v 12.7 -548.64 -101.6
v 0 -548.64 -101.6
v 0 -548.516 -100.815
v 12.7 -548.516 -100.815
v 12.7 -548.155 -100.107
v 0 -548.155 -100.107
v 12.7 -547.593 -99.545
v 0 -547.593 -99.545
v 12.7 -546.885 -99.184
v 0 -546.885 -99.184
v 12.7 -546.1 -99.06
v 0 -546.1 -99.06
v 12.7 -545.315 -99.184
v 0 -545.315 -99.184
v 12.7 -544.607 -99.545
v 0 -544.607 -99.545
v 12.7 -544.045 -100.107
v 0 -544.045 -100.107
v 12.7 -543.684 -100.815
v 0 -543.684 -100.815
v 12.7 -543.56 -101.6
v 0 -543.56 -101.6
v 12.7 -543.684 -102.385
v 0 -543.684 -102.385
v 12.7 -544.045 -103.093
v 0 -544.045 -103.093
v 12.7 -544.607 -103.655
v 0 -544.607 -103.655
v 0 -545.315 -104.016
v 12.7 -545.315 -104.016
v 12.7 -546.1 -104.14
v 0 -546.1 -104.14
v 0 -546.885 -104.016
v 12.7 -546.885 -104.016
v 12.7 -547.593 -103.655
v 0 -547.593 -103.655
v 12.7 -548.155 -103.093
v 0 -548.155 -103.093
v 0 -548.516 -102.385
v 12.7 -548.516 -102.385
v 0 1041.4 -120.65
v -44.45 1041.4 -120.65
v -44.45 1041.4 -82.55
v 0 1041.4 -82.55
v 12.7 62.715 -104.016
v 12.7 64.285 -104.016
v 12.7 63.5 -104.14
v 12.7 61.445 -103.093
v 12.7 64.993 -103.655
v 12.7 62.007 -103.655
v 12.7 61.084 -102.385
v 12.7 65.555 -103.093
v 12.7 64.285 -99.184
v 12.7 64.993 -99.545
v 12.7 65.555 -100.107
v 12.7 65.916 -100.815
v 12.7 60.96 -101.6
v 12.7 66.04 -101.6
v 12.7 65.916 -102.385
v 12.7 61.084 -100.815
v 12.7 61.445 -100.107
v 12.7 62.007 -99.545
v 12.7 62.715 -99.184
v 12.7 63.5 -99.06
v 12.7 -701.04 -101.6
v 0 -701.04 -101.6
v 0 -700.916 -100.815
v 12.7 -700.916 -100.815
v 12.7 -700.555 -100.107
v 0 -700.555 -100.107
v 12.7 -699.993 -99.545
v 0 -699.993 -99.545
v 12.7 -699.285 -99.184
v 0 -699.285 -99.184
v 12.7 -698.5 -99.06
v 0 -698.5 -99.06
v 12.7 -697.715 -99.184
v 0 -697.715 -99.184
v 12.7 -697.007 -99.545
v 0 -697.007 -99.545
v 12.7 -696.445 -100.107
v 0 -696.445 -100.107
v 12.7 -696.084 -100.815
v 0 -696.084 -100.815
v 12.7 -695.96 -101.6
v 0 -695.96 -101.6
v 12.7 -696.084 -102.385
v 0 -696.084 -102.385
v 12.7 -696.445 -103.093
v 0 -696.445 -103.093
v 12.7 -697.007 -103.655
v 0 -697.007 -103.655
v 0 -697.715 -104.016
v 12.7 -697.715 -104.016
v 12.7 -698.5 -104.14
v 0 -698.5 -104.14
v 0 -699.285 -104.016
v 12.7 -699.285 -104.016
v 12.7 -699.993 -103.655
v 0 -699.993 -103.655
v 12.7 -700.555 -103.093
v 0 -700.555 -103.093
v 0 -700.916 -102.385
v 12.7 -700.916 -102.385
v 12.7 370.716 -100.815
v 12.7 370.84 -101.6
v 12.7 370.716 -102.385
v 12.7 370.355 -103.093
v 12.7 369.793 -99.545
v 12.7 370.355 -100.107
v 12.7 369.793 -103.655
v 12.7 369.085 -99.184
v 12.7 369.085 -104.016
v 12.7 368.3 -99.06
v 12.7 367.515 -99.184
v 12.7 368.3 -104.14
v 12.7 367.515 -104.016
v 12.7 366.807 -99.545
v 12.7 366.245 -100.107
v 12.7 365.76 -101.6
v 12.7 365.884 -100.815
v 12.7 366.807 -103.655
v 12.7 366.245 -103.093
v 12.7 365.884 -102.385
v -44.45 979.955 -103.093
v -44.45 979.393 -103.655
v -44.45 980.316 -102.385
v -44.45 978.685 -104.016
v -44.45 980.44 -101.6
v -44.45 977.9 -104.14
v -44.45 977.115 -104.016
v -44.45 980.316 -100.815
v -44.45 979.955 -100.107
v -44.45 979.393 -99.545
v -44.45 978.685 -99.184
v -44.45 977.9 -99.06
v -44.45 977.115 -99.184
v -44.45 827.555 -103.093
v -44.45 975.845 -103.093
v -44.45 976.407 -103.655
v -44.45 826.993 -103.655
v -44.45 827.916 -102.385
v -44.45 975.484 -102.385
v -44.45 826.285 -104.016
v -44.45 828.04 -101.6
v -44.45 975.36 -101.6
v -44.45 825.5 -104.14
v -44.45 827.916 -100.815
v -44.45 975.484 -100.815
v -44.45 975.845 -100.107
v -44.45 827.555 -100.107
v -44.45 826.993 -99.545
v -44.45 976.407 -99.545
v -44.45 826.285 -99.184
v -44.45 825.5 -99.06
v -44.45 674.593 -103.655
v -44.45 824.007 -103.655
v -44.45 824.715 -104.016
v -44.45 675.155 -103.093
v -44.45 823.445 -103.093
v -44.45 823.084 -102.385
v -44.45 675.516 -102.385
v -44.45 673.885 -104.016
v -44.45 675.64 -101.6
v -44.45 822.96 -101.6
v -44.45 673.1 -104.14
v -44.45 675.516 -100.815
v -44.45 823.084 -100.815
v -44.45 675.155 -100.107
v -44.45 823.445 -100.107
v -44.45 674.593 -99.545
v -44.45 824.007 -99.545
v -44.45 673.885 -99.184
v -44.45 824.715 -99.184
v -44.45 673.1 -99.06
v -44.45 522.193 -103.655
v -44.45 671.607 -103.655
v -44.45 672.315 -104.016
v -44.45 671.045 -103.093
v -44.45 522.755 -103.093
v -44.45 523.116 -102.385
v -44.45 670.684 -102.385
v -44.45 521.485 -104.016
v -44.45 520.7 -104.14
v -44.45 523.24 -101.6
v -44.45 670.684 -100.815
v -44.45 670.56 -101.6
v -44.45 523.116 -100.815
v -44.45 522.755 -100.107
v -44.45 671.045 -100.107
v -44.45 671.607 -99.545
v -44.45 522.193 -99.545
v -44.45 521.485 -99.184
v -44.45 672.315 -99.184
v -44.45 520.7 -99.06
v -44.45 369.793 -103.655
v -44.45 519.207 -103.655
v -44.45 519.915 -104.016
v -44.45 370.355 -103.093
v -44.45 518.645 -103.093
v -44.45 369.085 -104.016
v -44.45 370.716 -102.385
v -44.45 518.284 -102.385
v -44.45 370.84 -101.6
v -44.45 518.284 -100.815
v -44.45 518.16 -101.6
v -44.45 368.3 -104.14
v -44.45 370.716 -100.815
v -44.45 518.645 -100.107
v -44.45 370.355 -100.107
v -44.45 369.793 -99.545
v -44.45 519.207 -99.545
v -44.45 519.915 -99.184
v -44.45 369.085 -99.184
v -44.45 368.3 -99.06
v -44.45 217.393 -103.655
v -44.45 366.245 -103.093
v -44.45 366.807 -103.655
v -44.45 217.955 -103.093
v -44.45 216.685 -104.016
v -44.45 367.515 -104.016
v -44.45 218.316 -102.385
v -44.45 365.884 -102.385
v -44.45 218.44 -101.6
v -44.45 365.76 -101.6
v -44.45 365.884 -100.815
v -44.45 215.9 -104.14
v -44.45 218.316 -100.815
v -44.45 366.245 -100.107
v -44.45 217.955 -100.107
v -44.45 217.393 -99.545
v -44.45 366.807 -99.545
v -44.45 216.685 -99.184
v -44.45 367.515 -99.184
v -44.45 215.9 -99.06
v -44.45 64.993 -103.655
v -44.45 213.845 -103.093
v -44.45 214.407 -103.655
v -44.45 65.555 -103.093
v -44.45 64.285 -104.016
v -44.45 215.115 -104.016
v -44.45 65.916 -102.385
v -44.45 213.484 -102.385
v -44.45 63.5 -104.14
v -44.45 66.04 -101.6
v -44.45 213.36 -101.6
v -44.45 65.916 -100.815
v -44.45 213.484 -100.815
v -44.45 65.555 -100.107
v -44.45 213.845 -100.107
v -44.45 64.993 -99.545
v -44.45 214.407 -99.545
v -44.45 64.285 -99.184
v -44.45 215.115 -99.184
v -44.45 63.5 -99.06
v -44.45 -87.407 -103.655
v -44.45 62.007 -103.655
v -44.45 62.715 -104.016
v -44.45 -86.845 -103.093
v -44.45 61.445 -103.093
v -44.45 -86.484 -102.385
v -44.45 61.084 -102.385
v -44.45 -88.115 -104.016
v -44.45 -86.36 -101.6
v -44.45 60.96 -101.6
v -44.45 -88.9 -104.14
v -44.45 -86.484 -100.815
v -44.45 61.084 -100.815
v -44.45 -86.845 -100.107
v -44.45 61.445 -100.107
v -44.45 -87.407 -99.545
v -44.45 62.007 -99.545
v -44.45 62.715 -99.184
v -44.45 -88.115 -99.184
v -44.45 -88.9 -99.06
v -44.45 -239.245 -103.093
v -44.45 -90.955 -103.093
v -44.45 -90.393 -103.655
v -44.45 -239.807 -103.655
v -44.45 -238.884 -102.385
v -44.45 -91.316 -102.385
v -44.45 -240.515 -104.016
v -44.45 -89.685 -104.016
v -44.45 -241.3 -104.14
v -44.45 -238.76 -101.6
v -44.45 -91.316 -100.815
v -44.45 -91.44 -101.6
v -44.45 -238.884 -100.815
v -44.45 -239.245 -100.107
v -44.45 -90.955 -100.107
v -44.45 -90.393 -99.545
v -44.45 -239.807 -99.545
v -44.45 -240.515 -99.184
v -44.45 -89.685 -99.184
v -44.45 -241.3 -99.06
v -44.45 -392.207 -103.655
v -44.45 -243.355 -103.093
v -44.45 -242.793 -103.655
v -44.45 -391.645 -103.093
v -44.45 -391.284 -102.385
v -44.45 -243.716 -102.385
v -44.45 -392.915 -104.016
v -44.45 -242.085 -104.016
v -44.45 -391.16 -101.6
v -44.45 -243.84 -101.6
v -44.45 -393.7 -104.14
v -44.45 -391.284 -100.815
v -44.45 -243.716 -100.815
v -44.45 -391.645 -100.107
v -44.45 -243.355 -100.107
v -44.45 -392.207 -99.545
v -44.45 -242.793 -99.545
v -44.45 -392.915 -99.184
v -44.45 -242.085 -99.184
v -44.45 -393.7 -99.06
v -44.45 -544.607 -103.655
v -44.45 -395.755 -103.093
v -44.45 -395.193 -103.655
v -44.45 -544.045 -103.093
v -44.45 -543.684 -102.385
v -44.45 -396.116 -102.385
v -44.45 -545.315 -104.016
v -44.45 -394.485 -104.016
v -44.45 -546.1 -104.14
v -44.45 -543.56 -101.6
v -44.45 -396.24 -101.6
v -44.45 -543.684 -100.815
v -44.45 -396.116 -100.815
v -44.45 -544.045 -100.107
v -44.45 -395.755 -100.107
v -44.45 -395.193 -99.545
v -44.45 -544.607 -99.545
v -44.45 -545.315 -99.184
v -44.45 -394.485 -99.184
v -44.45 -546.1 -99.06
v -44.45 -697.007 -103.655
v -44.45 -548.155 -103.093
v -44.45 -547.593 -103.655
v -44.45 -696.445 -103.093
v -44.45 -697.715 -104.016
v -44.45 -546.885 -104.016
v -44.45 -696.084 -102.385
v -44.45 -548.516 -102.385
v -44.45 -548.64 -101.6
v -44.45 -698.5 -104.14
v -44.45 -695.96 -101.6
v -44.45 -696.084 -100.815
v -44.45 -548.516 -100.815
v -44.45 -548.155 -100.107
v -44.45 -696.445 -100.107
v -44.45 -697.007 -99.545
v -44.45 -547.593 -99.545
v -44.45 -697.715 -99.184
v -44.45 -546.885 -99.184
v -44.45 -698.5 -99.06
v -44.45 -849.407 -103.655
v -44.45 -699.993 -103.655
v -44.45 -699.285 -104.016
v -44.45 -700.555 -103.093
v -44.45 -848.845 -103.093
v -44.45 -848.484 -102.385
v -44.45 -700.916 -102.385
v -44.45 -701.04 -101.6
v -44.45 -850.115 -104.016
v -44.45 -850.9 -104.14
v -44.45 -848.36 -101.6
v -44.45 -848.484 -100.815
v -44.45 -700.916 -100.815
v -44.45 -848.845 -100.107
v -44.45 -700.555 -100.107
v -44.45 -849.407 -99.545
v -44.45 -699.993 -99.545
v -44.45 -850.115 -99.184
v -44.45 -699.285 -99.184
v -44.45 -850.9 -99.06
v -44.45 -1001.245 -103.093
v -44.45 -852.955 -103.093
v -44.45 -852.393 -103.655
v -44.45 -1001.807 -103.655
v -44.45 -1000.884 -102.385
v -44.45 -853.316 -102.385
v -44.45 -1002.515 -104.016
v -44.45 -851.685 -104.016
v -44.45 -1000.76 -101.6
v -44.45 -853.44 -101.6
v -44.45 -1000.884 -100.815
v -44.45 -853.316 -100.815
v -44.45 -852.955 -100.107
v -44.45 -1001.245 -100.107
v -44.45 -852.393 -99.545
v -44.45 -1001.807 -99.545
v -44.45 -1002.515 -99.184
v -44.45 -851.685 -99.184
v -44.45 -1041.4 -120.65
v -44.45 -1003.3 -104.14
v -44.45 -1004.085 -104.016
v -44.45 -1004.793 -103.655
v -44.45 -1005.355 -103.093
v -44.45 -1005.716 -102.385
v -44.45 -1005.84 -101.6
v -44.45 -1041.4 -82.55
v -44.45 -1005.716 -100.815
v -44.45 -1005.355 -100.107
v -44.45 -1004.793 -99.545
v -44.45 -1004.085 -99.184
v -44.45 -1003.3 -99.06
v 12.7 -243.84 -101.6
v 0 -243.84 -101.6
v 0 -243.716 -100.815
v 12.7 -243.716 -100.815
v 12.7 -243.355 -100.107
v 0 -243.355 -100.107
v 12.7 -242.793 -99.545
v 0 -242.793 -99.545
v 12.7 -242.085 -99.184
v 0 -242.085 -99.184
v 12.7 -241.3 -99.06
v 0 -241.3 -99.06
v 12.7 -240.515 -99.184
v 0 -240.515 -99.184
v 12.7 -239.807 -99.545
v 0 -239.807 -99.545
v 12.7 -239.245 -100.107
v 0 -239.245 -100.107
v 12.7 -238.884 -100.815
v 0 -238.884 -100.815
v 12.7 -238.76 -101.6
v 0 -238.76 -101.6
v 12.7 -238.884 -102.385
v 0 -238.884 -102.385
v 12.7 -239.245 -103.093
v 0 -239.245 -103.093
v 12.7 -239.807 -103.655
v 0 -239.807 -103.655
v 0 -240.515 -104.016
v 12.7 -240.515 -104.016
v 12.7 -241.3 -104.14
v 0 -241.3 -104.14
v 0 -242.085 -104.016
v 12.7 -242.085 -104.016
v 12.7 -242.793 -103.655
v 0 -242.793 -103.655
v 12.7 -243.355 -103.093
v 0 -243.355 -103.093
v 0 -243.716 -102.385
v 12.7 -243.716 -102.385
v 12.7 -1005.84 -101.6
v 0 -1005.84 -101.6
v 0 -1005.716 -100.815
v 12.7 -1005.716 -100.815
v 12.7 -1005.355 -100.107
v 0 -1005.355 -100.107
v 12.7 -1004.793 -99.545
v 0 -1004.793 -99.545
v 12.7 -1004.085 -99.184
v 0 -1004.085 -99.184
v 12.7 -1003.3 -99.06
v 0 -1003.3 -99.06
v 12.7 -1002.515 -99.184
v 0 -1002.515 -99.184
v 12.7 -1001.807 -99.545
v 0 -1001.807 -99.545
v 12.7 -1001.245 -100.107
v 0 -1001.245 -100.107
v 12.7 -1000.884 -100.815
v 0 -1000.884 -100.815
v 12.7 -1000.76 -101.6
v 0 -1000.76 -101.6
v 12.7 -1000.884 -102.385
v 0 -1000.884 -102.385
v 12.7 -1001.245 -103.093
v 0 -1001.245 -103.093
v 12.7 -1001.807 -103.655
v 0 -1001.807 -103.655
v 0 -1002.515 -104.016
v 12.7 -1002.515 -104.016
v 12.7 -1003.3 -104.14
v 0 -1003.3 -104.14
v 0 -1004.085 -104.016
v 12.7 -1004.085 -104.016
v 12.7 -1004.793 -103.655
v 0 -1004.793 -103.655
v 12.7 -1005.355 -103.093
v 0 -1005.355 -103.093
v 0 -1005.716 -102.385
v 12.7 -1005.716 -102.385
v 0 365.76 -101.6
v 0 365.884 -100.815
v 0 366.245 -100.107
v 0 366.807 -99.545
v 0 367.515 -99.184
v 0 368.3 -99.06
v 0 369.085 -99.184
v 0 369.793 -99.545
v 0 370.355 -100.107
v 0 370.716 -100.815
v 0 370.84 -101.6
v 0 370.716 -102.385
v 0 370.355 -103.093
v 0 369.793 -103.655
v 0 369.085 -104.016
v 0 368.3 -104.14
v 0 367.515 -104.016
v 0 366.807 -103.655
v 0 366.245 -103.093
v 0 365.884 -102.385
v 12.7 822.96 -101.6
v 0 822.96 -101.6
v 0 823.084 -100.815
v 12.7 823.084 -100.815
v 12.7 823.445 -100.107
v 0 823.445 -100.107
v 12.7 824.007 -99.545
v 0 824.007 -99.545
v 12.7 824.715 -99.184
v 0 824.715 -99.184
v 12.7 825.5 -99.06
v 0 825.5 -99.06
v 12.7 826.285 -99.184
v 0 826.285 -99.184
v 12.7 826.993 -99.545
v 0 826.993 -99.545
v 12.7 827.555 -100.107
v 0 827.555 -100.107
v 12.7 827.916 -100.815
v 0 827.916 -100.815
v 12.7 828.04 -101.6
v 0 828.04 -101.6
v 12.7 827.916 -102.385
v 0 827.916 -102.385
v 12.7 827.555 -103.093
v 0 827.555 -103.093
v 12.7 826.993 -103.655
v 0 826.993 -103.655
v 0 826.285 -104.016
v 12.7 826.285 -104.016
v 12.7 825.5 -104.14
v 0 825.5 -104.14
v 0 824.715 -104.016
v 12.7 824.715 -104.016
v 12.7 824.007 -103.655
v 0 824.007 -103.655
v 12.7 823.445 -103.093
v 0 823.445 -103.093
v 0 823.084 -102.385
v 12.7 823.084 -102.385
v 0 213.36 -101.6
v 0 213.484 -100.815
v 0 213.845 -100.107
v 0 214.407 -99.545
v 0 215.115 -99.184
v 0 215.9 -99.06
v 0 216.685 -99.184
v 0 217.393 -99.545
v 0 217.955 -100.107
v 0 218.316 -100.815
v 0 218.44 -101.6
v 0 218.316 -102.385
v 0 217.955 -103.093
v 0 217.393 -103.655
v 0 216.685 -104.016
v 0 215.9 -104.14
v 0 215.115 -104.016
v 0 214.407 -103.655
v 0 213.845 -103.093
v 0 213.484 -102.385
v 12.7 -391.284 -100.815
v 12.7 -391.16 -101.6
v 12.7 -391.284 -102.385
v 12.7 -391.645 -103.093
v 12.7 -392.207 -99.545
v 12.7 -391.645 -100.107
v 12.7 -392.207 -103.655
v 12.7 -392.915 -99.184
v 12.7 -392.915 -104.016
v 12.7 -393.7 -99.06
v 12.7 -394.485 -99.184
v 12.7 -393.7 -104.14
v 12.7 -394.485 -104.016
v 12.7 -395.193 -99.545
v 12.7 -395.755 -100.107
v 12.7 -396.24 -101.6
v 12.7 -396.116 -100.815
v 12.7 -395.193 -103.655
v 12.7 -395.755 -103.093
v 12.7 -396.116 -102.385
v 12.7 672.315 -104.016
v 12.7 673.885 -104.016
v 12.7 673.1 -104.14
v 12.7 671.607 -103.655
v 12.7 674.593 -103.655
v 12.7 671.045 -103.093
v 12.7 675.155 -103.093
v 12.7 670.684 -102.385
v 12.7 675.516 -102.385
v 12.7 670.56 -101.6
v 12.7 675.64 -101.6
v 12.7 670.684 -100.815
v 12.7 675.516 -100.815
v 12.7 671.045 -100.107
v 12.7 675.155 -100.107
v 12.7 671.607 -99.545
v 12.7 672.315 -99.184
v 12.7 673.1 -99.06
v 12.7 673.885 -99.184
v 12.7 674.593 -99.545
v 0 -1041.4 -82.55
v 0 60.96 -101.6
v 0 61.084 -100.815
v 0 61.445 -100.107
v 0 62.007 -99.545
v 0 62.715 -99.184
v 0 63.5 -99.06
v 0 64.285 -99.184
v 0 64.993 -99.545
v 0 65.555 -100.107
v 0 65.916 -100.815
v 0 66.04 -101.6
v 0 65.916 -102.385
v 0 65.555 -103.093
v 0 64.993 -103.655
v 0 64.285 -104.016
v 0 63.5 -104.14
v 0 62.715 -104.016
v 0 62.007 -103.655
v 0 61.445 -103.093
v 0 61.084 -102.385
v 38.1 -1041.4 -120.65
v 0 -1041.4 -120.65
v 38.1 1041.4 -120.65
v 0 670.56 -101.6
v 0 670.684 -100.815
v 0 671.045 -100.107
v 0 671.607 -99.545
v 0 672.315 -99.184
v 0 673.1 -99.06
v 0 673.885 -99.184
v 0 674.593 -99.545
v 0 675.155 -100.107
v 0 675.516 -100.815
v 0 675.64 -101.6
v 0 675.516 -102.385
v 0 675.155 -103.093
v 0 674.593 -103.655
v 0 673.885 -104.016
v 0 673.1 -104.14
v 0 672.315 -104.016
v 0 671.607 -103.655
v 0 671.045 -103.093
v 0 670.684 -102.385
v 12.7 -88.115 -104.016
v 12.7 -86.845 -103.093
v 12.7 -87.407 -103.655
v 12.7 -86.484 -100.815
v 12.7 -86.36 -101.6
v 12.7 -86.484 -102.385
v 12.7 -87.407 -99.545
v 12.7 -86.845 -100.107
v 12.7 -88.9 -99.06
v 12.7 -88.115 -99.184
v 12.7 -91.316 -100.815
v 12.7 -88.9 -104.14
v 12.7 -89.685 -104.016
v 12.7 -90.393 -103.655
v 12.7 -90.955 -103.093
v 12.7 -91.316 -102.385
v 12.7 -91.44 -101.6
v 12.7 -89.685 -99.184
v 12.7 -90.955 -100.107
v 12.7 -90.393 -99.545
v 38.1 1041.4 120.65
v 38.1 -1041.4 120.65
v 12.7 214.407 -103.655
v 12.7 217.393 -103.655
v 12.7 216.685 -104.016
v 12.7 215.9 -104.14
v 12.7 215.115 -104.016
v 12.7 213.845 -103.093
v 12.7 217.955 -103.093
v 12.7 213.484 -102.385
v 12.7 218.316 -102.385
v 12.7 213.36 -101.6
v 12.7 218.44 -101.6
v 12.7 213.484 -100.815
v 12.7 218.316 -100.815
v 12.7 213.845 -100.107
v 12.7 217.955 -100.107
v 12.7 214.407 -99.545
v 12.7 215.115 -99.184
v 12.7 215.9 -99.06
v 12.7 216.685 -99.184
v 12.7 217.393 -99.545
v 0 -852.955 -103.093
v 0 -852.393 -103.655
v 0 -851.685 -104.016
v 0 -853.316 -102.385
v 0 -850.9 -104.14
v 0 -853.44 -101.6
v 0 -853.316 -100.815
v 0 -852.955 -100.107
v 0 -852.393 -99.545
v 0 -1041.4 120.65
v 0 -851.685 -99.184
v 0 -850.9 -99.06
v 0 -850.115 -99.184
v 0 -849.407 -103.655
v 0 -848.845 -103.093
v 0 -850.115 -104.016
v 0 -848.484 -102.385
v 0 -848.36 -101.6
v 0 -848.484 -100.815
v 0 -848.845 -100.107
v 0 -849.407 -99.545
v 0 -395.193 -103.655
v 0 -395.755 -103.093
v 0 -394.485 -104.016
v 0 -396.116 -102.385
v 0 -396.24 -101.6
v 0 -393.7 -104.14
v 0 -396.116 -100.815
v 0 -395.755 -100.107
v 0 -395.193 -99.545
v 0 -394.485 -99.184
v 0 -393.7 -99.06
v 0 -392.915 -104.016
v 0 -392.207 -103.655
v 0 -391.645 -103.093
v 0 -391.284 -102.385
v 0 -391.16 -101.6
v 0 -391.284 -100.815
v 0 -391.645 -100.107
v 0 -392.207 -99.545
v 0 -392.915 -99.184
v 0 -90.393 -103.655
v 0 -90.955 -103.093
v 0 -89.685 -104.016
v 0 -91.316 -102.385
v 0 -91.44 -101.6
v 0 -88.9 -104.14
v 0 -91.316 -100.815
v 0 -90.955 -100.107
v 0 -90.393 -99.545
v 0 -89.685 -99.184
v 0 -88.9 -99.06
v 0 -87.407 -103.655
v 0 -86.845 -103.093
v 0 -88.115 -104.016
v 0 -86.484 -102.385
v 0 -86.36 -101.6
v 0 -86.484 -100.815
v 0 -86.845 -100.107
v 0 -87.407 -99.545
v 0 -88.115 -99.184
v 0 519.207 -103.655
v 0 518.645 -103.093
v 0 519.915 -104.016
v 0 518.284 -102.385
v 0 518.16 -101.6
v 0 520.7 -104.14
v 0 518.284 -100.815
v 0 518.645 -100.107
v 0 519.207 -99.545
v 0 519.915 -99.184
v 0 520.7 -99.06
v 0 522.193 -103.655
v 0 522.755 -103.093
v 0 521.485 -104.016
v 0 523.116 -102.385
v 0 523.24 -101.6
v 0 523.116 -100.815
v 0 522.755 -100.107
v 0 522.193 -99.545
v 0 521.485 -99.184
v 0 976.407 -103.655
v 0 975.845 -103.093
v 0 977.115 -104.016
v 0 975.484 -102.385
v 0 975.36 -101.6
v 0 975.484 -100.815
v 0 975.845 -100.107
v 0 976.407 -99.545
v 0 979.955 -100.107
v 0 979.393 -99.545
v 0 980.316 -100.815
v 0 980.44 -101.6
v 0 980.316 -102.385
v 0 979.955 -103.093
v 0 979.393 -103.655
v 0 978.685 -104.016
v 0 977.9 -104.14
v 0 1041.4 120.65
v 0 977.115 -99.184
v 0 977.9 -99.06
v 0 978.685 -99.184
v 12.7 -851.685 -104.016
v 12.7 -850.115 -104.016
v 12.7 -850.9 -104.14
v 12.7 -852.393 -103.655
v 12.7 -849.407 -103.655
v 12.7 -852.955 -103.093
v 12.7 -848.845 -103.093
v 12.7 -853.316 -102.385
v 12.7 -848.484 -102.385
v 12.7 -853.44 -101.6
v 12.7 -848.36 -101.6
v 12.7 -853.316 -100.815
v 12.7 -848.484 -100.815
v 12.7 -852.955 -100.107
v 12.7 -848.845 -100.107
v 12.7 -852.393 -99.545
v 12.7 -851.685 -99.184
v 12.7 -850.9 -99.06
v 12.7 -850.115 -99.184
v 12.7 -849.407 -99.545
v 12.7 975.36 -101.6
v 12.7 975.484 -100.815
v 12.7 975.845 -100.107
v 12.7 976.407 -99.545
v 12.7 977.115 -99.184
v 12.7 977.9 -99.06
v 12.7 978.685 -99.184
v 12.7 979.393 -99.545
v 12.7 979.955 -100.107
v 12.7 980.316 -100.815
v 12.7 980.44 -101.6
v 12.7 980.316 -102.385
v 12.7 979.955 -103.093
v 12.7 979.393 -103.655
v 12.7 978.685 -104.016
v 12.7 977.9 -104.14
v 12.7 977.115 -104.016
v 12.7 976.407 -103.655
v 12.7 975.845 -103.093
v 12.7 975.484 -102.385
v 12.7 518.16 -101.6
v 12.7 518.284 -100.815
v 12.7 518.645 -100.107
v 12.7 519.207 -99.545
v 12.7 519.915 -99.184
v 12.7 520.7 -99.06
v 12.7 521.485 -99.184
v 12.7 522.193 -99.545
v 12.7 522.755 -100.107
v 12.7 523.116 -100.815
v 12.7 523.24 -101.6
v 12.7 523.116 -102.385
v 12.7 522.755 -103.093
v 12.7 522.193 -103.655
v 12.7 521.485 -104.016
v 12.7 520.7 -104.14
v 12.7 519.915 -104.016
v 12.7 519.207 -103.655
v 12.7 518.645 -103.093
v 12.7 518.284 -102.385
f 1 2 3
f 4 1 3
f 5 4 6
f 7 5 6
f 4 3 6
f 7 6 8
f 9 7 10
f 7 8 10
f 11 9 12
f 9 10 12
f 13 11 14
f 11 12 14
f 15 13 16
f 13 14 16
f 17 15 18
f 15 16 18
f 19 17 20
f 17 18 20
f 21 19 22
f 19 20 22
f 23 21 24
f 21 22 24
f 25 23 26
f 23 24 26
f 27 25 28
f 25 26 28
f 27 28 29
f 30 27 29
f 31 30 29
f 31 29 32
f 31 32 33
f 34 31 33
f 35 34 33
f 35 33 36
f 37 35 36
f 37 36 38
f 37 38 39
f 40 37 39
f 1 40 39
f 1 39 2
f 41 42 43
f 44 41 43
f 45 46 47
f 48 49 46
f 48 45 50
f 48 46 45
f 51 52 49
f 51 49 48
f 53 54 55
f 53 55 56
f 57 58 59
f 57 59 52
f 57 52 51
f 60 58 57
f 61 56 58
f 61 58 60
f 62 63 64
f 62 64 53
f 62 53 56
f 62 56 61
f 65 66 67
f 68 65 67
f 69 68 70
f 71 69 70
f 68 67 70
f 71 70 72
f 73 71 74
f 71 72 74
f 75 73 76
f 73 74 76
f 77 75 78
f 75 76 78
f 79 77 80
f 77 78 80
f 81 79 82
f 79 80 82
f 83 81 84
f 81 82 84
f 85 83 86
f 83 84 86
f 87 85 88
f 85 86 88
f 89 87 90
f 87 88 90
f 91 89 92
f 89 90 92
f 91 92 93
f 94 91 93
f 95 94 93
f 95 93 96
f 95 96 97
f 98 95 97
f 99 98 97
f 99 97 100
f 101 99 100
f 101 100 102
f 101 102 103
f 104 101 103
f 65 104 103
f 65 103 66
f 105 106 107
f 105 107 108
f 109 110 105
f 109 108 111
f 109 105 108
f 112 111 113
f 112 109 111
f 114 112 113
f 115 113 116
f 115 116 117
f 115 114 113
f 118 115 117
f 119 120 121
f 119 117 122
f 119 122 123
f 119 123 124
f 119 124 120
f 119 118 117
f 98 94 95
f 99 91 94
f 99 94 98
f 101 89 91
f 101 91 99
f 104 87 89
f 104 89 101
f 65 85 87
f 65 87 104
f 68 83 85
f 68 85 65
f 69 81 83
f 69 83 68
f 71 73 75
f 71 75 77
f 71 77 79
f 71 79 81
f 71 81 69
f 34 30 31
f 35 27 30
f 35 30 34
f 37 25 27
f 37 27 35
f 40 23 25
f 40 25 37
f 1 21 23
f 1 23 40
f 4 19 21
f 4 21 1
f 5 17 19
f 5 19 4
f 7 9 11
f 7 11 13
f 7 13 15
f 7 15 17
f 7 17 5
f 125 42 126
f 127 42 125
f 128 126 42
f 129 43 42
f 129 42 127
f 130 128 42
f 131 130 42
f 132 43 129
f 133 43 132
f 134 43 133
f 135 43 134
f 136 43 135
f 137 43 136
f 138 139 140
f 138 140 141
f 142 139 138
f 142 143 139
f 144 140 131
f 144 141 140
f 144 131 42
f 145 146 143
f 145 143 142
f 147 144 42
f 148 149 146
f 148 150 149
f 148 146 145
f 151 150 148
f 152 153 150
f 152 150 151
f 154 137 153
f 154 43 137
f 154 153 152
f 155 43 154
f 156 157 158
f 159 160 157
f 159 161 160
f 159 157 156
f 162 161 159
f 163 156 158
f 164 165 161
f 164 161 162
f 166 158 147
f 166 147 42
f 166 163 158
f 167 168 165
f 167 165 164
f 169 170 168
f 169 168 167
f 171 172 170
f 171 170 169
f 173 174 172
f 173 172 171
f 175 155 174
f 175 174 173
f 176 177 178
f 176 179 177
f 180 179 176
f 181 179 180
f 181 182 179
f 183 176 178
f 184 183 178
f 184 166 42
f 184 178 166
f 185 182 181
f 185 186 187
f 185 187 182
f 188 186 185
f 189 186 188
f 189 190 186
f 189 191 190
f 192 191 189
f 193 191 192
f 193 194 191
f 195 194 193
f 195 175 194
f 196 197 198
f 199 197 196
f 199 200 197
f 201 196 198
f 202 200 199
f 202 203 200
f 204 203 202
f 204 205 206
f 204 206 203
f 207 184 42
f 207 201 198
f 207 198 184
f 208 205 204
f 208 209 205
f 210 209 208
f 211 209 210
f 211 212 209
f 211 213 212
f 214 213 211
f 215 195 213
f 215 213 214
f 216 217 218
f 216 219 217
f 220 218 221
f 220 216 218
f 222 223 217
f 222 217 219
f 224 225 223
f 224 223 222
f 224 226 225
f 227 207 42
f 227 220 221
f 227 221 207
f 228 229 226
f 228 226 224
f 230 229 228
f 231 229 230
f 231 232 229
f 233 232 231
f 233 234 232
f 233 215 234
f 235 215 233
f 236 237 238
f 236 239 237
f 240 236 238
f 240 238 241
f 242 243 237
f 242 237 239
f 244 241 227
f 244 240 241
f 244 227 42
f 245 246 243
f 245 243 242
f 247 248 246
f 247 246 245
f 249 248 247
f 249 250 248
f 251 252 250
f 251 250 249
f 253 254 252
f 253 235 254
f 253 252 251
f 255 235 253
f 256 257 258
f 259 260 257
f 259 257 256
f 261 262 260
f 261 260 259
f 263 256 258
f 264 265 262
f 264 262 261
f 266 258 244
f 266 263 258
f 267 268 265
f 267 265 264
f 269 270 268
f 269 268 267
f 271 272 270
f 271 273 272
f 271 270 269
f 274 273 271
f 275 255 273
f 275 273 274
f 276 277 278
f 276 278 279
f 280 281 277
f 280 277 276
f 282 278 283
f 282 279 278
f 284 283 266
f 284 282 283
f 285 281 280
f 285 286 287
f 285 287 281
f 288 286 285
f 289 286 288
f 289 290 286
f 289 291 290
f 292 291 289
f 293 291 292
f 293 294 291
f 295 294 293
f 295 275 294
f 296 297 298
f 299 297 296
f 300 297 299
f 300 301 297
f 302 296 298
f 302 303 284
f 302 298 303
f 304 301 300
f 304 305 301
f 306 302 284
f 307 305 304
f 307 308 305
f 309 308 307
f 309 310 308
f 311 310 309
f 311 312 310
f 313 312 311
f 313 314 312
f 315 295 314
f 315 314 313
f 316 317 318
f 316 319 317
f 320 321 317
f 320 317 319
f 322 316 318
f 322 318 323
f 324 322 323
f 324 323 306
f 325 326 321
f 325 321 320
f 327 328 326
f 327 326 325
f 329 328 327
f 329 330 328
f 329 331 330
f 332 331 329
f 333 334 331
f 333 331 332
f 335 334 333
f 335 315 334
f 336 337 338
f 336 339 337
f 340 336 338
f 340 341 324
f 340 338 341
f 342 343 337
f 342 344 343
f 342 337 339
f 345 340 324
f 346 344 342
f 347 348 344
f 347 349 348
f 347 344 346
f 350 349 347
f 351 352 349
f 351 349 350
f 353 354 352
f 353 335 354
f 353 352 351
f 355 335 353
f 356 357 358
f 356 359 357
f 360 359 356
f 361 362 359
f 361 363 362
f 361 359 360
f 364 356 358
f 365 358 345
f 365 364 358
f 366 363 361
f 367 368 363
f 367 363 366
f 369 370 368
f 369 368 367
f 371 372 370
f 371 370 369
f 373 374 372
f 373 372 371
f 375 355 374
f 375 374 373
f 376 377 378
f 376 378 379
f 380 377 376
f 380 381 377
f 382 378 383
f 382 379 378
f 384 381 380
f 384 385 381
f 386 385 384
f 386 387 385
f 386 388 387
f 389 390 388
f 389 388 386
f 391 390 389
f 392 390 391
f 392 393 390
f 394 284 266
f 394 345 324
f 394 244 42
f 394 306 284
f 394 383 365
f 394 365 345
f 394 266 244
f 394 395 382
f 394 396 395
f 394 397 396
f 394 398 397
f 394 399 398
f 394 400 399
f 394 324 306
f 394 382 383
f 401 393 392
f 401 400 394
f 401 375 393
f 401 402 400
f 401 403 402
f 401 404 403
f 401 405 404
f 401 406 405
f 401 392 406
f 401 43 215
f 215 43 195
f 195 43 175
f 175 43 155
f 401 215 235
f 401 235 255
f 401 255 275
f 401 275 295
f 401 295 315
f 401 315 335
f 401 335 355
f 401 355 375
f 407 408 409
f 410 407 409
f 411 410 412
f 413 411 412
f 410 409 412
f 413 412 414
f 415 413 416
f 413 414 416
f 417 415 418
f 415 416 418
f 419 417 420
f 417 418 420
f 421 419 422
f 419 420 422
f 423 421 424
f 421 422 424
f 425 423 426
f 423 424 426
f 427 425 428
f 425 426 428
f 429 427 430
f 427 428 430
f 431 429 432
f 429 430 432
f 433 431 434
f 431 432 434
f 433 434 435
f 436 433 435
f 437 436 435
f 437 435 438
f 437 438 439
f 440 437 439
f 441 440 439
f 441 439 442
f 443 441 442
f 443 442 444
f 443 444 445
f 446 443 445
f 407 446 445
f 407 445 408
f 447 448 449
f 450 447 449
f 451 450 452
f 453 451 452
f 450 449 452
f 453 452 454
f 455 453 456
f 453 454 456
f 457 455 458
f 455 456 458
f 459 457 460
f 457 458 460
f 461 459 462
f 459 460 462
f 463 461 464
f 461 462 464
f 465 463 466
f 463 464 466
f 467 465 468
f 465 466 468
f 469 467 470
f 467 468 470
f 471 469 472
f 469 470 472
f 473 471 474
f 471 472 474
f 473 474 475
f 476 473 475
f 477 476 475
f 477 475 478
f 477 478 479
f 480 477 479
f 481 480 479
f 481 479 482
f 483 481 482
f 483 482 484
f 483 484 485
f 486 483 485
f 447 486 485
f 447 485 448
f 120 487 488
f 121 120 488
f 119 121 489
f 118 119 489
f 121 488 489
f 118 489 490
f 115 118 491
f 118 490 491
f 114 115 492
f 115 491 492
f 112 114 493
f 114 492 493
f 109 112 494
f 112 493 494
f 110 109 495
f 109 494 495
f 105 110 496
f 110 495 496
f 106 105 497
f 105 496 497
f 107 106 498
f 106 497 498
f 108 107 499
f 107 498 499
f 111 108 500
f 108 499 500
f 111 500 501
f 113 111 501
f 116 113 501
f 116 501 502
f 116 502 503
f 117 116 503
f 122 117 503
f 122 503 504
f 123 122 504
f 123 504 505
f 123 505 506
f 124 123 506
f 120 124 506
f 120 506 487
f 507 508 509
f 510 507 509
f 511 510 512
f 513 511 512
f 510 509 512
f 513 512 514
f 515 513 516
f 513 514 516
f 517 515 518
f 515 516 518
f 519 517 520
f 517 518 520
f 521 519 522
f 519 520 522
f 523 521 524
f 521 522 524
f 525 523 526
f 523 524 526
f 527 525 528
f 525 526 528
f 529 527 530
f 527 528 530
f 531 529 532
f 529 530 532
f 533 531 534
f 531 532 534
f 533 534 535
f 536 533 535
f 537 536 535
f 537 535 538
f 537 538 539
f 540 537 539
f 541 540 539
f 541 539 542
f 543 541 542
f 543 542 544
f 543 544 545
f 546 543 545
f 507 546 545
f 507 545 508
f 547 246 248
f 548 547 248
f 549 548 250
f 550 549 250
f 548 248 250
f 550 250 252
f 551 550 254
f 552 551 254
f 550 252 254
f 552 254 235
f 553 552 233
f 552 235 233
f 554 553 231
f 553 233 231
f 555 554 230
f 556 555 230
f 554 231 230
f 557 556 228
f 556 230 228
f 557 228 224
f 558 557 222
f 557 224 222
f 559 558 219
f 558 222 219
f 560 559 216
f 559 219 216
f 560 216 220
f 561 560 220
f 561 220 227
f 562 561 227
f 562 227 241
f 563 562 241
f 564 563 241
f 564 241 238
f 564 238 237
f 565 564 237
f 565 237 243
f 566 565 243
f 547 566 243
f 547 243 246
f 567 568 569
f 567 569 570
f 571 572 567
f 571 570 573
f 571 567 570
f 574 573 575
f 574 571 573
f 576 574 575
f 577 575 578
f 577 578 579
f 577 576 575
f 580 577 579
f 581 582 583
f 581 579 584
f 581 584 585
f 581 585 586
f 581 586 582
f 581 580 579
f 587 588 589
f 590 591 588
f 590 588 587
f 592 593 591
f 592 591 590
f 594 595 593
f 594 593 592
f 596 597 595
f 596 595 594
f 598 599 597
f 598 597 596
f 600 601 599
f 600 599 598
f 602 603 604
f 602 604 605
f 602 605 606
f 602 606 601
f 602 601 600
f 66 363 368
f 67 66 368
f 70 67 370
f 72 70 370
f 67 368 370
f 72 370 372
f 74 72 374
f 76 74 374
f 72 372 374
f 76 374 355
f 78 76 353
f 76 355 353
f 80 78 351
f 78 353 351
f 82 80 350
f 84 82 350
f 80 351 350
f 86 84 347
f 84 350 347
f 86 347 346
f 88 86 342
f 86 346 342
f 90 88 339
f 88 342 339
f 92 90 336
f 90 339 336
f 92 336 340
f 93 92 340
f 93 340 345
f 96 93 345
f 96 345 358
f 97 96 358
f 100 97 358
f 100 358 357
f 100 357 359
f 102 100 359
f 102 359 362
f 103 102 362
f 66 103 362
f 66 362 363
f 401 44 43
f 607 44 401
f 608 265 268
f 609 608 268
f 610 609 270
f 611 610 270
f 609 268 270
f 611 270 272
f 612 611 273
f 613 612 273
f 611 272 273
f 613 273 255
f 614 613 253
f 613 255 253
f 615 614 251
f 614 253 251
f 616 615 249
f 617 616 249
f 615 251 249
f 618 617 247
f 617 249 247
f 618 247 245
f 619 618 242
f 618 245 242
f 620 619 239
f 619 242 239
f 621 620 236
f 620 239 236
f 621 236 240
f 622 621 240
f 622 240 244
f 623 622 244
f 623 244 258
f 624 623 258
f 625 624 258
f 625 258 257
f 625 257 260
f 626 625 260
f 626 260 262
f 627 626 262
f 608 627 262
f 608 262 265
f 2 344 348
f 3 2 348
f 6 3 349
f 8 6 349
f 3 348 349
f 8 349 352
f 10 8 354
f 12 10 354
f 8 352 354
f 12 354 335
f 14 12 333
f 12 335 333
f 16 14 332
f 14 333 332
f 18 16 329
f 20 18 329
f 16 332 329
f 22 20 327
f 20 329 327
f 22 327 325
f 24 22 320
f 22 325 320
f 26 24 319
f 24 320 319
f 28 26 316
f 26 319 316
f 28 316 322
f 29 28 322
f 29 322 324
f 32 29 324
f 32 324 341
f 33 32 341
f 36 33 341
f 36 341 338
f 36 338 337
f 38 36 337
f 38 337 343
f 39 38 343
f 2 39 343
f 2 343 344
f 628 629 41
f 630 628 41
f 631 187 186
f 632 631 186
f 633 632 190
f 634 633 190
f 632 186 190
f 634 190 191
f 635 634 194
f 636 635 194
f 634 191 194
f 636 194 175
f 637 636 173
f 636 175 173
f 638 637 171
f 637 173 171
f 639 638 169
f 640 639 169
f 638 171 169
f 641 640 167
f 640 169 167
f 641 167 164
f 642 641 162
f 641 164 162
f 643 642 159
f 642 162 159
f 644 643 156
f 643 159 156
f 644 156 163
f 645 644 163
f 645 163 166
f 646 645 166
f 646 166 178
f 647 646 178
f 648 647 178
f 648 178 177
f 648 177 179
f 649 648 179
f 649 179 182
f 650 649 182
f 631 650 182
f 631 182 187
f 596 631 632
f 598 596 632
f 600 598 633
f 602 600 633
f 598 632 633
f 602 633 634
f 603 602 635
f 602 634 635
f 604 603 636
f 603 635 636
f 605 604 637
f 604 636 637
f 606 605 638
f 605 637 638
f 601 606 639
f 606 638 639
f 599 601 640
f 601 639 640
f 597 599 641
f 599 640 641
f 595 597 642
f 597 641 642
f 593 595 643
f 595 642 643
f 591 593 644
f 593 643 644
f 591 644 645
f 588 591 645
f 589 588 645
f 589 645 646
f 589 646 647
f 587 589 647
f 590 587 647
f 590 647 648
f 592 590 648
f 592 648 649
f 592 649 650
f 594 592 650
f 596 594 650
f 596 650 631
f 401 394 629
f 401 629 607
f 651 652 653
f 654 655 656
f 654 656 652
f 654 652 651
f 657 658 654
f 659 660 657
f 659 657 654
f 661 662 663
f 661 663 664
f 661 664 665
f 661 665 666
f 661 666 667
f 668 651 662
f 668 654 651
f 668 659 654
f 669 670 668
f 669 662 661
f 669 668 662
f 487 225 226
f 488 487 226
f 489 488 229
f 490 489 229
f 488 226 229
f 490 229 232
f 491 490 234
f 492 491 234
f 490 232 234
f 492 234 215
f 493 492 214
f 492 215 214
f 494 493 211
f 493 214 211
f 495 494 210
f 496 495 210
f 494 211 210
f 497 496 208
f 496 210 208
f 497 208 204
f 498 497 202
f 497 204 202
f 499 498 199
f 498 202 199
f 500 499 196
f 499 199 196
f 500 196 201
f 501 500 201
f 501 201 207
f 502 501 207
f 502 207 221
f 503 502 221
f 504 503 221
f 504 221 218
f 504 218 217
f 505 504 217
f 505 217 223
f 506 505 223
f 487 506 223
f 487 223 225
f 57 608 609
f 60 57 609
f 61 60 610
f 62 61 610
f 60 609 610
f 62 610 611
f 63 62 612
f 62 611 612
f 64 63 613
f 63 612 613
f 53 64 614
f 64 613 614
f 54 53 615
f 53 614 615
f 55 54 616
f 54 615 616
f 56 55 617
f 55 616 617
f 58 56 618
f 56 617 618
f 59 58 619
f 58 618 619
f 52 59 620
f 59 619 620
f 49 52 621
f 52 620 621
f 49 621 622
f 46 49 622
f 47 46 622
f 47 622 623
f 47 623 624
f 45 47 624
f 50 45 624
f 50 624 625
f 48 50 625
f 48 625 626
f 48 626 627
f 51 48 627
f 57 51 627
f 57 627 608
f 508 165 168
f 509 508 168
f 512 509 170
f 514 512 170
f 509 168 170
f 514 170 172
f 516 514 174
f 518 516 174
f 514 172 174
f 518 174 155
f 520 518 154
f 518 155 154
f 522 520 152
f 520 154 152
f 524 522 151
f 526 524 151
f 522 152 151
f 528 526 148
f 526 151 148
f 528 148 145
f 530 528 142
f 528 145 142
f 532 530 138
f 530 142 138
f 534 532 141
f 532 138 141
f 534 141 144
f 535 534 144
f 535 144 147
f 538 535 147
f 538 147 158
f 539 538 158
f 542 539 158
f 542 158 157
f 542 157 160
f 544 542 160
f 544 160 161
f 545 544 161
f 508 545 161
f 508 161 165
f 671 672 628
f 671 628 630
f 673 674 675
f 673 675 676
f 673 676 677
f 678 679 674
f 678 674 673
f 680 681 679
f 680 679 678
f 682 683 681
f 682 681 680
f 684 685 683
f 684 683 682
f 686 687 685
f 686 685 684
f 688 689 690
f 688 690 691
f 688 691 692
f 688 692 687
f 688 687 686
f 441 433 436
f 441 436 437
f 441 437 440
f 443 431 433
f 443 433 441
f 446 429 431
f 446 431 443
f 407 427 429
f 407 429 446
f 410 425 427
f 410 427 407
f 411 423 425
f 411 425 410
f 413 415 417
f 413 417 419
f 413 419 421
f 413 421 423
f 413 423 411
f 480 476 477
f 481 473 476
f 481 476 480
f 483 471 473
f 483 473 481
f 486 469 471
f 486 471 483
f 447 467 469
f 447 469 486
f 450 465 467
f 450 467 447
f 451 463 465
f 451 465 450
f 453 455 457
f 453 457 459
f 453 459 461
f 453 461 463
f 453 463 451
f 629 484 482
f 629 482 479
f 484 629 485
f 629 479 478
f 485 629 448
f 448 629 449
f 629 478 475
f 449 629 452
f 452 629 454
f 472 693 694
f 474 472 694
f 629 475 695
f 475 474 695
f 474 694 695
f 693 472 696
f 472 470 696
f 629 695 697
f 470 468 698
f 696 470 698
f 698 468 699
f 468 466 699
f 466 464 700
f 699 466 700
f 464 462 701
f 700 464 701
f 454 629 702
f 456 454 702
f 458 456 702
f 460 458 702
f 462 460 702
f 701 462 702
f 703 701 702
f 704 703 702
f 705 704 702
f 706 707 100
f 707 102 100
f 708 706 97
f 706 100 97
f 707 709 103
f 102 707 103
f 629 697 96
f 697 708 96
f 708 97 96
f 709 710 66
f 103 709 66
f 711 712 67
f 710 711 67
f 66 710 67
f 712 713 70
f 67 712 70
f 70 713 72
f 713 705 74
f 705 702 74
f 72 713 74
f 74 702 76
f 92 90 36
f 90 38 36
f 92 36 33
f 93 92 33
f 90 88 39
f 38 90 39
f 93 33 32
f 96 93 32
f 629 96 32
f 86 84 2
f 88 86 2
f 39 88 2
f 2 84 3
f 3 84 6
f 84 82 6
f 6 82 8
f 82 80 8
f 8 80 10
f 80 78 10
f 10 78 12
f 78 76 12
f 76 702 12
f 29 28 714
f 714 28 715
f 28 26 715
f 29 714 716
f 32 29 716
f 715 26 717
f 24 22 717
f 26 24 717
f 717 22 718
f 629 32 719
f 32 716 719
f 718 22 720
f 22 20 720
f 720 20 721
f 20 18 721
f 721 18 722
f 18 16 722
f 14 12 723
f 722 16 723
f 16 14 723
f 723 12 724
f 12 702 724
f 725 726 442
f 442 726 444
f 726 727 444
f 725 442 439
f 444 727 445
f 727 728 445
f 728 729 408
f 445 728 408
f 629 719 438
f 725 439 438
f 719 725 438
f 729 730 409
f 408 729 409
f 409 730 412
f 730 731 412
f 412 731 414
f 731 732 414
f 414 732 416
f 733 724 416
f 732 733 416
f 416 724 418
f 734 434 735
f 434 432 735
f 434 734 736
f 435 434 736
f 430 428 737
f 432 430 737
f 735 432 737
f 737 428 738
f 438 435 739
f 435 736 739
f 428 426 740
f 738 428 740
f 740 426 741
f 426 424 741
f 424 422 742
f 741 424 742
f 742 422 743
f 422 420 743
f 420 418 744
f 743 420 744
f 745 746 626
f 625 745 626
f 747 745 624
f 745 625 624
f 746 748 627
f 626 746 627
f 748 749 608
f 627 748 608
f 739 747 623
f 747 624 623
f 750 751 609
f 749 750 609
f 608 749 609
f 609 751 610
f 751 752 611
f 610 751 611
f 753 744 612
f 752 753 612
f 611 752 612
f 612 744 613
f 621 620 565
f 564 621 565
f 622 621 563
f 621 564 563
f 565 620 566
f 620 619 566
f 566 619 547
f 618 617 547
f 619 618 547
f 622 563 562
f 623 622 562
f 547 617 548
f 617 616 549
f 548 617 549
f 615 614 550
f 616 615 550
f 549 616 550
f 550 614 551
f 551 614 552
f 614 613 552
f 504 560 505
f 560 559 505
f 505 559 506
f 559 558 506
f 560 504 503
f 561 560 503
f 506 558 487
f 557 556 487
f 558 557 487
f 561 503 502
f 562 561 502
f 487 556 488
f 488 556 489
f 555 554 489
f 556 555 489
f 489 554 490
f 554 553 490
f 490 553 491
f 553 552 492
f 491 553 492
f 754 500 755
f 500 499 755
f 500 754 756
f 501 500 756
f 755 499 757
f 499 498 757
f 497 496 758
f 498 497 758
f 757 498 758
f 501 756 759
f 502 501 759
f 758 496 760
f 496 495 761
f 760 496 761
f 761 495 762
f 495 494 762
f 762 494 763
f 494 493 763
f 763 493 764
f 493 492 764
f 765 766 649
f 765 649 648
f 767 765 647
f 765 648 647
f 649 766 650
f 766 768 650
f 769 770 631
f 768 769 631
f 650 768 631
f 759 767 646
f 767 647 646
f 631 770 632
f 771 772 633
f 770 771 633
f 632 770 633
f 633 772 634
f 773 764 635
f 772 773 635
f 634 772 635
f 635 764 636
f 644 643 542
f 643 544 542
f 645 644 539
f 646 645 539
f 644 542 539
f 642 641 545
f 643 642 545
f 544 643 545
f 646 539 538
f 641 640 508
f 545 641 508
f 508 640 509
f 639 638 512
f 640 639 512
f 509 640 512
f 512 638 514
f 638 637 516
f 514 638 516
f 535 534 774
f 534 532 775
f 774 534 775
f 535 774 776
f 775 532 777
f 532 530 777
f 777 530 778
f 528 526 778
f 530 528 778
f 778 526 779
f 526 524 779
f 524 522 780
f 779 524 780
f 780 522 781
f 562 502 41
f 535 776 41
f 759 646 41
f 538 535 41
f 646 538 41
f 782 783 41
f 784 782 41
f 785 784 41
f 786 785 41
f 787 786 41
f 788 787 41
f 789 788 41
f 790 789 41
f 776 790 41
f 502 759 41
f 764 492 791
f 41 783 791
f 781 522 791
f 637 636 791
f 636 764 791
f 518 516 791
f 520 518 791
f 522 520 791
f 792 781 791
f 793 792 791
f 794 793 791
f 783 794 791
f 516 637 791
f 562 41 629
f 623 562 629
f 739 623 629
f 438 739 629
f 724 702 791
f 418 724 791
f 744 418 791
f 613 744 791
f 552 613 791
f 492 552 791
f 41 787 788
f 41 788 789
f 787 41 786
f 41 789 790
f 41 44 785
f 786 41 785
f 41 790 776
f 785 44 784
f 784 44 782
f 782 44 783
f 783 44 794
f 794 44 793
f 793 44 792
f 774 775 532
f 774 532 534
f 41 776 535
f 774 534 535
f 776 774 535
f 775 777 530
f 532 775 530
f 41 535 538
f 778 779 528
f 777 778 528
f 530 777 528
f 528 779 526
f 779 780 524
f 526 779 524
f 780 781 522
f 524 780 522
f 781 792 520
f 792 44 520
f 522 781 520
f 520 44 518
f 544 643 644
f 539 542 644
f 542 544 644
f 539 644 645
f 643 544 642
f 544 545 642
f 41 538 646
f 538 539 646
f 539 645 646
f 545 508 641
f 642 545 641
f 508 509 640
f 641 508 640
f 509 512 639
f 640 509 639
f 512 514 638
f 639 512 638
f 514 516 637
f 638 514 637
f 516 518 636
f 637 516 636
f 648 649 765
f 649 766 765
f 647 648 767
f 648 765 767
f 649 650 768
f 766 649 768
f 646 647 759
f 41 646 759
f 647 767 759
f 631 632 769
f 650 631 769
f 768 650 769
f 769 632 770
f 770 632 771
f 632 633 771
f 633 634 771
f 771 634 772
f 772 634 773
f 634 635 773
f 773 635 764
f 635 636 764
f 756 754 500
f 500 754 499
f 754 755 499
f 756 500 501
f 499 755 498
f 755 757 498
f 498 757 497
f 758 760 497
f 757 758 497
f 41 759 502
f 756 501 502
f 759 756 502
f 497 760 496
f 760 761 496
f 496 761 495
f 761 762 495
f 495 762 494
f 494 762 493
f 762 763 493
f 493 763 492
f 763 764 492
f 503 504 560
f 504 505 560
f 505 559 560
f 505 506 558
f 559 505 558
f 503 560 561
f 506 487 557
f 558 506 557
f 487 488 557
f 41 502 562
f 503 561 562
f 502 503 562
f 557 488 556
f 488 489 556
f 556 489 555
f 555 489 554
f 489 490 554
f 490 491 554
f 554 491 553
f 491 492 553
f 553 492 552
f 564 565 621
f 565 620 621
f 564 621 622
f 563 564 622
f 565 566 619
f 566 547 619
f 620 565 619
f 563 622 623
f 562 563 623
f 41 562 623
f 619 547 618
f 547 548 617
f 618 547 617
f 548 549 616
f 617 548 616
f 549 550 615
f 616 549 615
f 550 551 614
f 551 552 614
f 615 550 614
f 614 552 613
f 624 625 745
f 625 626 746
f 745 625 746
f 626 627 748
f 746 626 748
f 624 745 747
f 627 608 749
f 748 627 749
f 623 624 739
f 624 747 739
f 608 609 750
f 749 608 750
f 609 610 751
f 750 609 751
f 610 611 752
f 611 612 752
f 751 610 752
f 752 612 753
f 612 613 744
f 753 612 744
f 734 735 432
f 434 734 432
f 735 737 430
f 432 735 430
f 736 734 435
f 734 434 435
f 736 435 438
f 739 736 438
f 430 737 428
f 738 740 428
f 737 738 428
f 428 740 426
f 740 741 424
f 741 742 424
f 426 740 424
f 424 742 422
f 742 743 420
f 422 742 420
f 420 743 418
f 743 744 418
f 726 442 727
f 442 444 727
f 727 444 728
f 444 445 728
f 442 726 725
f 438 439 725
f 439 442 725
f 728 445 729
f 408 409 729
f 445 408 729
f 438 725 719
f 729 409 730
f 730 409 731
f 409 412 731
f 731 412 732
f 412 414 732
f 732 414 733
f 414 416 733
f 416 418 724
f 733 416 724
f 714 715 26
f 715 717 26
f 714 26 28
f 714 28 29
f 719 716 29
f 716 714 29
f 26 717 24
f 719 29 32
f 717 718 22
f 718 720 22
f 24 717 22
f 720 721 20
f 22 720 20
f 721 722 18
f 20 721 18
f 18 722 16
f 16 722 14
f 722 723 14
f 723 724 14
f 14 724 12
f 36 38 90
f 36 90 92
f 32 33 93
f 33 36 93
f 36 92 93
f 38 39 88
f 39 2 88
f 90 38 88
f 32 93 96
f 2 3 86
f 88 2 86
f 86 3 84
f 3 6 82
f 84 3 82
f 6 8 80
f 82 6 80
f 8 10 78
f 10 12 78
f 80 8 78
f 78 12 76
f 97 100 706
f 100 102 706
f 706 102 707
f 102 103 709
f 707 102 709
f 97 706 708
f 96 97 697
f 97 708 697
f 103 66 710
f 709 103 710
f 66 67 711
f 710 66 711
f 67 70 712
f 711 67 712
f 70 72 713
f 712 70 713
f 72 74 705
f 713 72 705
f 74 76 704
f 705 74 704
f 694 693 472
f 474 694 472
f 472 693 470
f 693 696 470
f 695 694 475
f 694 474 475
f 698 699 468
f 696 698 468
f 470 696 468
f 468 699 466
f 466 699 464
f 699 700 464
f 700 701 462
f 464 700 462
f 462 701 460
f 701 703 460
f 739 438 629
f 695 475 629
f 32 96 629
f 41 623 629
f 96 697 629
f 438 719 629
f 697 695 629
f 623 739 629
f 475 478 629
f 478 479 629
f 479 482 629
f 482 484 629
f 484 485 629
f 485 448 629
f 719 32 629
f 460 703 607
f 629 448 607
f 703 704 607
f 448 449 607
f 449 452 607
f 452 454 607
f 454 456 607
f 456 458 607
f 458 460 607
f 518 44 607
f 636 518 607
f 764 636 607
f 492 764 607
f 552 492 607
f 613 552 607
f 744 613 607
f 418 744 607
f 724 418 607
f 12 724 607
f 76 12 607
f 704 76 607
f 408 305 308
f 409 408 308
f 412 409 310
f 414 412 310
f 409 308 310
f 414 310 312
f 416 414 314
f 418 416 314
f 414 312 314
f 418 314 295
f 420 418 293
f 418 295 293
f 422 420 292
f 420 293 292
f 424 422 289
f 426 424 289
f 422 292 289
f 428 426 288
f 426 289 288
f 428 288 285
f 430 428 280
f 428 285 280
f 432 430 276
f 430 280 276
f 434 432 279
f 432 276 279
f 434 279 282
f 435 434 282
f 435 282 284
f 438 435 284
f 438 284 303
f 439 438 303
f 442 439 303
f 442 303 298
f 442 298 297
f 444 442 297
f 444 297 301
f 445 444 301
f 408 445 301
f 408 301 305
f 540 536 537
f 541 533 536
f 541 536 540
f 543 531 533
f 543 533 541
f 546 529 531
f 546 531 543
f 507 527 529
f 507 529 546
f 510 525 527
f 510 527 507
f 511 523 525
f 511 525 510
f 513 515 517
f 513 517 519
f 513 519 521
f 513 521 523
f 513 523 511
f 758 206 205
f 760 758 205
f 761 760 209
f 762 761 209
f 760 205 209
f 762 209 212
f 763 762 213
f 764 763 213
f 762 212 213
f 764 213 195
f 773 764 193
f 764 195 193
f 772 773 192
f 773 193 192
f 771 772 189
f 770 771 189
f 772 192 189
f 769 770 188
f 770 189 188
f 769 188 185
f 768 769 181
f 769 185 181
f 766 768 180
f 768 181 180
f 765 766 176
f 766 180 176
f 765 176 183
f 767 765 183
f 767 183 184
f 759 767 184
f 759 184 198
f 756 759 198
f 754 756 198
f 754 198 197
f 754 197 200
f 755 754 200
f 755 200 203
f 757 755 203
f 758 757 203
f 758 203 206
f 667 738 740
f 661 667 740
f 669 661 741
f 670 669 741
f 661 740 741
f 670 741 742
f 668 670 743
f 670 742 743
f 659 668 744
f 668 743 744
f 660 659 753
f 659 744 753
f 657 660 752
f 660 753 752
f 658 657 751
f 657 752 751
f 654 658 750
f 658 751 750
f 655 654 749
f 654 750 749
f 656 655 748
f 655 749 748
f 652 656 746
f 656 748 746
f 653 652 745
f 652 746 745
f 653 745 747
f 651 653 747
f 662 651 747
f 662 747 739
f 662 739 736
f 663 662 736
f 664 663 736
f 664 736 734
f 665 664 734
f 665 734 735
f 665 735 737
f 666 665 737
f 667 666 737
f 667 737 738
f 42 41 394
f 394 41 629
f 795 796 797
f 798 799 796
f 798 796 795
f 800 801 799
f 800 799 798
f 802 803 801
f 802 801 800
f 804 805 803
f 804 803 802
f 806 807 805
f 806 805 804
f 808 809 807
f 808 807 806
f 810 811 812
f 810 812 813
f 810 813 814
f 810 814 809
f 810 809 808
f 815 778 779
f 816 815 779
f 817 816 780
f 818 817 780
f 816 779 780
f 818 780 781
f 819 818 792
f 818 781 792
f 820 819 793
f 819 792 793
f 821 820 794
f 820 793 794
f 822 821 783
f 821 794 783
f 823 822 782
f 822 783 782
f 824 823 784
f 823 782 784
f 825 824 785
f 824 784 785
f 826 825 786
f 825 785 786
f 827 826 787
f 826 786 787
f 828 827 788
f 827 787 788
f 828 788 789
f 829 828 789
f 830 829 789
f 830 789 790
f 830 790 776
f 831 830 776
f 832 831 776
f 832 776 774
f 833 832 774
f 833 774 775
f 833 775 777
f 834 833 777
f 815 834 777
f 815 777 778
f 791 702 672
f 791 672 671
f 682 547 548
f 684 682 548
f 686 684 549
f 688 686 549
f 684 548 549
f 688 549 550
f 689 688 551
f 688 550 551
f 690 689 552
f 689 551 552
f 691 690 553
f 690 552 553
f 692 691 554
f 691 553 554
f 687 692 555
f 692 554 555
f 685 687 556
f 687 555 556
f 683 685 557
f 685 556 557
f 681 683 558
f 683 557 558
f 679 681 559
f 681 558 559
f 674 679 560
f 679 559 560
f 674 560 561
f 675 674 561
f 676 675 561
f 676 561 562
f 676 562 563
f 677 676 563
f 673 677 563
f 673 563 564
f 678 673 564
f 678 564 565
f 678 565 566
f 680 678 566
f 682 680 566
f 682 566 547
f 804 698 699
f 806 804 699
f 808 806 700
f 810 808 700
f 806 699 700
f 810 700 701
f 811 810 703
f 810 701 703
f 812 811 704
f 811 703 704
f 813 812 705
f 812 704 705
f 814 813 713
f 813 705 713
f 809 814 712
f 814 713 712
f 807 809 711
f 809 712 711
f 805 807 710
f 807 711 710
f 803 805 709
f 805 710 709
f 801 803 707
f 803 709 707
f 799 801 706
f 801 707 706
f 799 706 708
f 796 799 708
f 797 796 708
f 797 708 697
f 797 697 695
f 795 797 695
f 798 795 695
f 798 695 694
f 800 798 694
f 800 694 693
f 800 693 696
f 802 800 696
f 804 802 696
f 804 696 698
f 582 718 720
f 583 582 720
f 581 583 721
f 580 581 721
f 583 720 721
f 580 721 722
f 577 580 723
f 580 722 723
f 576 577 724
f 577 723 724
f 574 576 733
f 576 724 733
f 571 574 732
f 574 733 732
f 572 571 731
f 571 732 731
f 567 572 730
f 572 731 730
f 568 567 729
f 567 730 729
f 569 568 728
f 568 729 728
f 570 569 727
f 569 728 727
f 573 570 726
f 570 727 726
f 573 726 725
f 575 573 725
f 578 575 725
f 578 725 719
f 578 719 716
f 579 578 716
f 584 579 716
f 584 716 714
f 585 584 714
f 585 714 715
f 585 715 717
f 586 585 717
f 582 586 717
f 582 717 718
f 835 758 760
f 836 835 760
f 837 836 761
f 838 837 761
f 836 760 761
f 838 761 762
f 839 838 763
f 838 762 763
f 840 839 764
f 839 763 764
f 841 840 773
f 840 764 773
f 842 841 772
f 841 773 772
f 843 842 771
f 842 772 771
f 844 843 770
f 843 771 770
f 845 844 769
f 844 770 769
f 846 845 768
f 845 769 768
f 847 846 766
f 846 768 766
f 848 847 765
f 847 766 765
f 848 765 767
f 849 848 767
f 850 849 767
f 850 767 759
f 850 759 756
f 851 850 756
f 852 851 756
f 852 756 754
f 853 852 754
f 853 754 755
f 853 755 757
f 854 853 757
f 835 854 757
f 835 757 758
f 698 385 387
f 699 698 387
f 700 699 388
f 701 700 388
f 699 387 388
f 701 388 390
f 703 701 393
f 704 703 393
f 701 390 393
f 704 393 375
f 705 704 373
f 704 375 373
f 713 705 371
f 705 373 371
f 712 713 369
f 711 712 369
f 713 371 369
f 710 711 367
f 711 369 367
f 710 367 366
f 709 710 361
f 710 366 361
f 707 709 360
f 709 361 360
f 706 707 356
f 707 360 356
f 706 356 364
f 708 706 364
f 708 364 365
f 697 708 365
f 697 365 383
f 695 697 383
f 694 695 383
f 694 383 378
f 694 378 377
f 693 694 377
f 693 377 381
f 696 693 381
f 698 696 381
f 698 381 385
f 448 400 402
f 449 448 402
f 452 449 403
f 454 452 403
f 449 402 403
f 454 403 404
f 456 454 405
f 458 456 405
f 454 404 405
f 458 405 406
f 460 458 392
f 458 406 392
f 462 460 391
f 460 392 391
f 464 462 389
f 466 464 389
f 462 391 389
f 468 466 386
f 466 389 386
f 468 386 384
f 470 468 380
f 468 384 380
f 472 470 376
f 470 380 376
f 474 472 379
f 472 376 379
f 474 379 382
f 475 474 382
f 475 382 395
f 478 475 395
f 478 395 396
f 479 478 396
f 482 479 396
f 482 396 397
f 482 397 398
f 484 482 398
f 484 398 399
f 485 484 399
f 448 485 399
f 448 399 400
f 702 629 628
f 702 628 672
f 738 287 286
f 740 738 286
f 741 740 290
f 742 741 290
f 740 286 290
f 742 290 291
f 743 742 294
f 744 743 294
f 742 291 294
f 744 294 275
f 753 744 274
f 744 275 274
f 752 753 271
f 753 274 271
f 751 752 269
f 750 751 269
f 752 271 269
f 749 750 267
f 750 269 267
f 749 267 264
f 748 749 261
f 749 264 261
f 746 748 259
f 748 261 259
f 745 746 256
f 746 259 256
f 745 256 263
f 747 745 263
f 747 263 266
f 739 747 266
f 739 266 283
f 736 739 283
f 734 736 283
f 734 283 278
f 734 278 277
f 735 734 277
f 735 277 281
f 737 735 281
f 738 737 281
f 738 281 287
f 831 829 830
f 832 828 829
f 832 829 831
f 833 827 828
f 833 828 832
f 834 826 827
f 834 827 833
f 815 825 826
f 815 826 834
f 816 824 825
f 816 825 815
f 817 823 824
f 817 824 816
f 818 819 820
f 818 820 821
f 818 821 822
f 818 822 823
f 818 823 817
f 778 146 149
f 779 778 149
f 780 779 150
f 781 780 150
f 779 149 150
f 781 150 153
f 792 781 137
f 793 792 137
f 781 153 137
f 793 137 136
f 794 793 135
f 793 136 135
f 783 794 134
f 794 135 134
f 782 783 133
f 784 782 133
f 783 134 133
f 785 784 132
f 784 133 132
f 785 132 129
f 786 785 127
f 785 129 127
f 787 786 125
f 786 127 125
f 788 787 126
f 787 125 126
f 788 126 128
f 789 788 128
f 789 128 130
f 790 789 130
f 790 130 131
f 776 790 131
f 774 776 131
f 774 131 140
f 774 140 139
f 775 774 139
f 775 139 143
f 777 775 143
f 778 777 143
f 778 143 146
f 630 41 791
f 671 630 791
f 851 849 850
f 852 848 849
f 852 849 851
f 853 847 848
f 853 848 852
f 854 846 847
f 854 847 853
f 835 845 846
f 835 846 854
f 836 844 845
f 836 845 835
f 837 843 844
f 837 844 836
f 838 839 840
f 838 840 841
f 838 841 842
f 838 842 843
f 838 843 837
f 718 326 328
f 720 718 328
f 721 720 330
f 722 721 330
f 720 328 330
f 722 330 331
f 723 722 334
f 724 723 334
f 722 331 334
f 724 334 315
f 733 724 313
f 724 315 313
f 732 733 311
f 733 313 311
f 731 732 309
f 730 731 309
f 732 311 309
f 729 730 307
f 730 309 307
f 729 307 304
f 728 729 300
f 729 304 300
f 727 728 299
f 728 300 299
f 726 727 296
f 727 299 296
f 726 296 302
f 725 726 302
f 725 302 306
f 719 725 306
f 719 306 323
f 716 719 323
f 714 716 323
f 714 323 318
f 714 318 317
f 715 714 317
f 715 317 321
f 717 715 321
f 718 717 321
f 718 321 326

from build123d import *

# Parameters (mm, degrees)
F0_W     = 2082.8
F0_H     = 241.3
F1_DEPTH = 38.1
F2_W     = 2082.8
F2_H     = 38.1
F3_DEPTH = 44.45
F4_R     = 2.54
F5_DEPTH = 57.15


with BuildPart() as f1:
    # F0 (on Right) → F1 (new body)
    with BuildSketch(Plane.YZ):
        Rectangle(F0_W, F0_H)
    extrude(amount=F1_DEPTH)


with BuildPart() as f3:
    # F2 (on face) → F3 (new body)
    with BuildSketch(Plane(origin=(0, 0, 0), x_dir=(0, -1, 0), z_dir=(-1, 0, 0))):
        with Locations((0, -101.6)):
            Rectangle(F2_W, F2_H)
    extrude(amount=F3_DEPTH)


with BuildPart() as f5_tool:
    # F4 (on face) → F5 (new body)
    with BuildSketch(Plane(origin=(-44.45, 0, 0), x_dir=(0, -1, 0), z_dir=(-1, 0, 0))):
        with Locations((1003.3, -101.6)):
            Circle(F4_R)
        with Locations((850.9, -101.6)):
            Circle(F4_R)
        with Locations((698.5, -101.6)):
            Circle(F4_R)
        with Locations((546.1, -101.6)):
            Circle(F4_R)
        with Locations((393.7, -101.6)):
            Circle(F4_R)
        with Locations((241.3, -101.6)):
            Circle(F4_R)
        with Locations((88.9, -101.6)):
            Circle(F4_R)
        with Locations((-63.5, -101.6)):
            Circle(F4_R)
        with Locations((-215.9, -101.6)):
            Circle(F4_R)
        with Locations((-368.3, -101.6)):
            Circle(F4_R)
        with Locations((-520.7, -101.6)):
            Circle(F4_R)
        with Locations((-673.1, -101.6)):
            Circle(F4_R)
        with Locations((-825.5, -101.6)):
            Circle(F4_R)
        with Locations((-977.9, -101.6)):
            Circle(F4_R)
    extrude(amount=-F5_DEPTH)


with BuildPart() as f1_1:
    add(f1.part)

    # F5: cut by f5_tool
    add(f5_tool.part, mode=Mode.SUBTRACT)


with BuildPart() as f3_1:
    add(f3.part)

    # F5: cut by f5_tool
    add(f5_tool.part, mode=Mode.SUBTRACT)


solid = Compound([f1_1.part, f3_1.part])
